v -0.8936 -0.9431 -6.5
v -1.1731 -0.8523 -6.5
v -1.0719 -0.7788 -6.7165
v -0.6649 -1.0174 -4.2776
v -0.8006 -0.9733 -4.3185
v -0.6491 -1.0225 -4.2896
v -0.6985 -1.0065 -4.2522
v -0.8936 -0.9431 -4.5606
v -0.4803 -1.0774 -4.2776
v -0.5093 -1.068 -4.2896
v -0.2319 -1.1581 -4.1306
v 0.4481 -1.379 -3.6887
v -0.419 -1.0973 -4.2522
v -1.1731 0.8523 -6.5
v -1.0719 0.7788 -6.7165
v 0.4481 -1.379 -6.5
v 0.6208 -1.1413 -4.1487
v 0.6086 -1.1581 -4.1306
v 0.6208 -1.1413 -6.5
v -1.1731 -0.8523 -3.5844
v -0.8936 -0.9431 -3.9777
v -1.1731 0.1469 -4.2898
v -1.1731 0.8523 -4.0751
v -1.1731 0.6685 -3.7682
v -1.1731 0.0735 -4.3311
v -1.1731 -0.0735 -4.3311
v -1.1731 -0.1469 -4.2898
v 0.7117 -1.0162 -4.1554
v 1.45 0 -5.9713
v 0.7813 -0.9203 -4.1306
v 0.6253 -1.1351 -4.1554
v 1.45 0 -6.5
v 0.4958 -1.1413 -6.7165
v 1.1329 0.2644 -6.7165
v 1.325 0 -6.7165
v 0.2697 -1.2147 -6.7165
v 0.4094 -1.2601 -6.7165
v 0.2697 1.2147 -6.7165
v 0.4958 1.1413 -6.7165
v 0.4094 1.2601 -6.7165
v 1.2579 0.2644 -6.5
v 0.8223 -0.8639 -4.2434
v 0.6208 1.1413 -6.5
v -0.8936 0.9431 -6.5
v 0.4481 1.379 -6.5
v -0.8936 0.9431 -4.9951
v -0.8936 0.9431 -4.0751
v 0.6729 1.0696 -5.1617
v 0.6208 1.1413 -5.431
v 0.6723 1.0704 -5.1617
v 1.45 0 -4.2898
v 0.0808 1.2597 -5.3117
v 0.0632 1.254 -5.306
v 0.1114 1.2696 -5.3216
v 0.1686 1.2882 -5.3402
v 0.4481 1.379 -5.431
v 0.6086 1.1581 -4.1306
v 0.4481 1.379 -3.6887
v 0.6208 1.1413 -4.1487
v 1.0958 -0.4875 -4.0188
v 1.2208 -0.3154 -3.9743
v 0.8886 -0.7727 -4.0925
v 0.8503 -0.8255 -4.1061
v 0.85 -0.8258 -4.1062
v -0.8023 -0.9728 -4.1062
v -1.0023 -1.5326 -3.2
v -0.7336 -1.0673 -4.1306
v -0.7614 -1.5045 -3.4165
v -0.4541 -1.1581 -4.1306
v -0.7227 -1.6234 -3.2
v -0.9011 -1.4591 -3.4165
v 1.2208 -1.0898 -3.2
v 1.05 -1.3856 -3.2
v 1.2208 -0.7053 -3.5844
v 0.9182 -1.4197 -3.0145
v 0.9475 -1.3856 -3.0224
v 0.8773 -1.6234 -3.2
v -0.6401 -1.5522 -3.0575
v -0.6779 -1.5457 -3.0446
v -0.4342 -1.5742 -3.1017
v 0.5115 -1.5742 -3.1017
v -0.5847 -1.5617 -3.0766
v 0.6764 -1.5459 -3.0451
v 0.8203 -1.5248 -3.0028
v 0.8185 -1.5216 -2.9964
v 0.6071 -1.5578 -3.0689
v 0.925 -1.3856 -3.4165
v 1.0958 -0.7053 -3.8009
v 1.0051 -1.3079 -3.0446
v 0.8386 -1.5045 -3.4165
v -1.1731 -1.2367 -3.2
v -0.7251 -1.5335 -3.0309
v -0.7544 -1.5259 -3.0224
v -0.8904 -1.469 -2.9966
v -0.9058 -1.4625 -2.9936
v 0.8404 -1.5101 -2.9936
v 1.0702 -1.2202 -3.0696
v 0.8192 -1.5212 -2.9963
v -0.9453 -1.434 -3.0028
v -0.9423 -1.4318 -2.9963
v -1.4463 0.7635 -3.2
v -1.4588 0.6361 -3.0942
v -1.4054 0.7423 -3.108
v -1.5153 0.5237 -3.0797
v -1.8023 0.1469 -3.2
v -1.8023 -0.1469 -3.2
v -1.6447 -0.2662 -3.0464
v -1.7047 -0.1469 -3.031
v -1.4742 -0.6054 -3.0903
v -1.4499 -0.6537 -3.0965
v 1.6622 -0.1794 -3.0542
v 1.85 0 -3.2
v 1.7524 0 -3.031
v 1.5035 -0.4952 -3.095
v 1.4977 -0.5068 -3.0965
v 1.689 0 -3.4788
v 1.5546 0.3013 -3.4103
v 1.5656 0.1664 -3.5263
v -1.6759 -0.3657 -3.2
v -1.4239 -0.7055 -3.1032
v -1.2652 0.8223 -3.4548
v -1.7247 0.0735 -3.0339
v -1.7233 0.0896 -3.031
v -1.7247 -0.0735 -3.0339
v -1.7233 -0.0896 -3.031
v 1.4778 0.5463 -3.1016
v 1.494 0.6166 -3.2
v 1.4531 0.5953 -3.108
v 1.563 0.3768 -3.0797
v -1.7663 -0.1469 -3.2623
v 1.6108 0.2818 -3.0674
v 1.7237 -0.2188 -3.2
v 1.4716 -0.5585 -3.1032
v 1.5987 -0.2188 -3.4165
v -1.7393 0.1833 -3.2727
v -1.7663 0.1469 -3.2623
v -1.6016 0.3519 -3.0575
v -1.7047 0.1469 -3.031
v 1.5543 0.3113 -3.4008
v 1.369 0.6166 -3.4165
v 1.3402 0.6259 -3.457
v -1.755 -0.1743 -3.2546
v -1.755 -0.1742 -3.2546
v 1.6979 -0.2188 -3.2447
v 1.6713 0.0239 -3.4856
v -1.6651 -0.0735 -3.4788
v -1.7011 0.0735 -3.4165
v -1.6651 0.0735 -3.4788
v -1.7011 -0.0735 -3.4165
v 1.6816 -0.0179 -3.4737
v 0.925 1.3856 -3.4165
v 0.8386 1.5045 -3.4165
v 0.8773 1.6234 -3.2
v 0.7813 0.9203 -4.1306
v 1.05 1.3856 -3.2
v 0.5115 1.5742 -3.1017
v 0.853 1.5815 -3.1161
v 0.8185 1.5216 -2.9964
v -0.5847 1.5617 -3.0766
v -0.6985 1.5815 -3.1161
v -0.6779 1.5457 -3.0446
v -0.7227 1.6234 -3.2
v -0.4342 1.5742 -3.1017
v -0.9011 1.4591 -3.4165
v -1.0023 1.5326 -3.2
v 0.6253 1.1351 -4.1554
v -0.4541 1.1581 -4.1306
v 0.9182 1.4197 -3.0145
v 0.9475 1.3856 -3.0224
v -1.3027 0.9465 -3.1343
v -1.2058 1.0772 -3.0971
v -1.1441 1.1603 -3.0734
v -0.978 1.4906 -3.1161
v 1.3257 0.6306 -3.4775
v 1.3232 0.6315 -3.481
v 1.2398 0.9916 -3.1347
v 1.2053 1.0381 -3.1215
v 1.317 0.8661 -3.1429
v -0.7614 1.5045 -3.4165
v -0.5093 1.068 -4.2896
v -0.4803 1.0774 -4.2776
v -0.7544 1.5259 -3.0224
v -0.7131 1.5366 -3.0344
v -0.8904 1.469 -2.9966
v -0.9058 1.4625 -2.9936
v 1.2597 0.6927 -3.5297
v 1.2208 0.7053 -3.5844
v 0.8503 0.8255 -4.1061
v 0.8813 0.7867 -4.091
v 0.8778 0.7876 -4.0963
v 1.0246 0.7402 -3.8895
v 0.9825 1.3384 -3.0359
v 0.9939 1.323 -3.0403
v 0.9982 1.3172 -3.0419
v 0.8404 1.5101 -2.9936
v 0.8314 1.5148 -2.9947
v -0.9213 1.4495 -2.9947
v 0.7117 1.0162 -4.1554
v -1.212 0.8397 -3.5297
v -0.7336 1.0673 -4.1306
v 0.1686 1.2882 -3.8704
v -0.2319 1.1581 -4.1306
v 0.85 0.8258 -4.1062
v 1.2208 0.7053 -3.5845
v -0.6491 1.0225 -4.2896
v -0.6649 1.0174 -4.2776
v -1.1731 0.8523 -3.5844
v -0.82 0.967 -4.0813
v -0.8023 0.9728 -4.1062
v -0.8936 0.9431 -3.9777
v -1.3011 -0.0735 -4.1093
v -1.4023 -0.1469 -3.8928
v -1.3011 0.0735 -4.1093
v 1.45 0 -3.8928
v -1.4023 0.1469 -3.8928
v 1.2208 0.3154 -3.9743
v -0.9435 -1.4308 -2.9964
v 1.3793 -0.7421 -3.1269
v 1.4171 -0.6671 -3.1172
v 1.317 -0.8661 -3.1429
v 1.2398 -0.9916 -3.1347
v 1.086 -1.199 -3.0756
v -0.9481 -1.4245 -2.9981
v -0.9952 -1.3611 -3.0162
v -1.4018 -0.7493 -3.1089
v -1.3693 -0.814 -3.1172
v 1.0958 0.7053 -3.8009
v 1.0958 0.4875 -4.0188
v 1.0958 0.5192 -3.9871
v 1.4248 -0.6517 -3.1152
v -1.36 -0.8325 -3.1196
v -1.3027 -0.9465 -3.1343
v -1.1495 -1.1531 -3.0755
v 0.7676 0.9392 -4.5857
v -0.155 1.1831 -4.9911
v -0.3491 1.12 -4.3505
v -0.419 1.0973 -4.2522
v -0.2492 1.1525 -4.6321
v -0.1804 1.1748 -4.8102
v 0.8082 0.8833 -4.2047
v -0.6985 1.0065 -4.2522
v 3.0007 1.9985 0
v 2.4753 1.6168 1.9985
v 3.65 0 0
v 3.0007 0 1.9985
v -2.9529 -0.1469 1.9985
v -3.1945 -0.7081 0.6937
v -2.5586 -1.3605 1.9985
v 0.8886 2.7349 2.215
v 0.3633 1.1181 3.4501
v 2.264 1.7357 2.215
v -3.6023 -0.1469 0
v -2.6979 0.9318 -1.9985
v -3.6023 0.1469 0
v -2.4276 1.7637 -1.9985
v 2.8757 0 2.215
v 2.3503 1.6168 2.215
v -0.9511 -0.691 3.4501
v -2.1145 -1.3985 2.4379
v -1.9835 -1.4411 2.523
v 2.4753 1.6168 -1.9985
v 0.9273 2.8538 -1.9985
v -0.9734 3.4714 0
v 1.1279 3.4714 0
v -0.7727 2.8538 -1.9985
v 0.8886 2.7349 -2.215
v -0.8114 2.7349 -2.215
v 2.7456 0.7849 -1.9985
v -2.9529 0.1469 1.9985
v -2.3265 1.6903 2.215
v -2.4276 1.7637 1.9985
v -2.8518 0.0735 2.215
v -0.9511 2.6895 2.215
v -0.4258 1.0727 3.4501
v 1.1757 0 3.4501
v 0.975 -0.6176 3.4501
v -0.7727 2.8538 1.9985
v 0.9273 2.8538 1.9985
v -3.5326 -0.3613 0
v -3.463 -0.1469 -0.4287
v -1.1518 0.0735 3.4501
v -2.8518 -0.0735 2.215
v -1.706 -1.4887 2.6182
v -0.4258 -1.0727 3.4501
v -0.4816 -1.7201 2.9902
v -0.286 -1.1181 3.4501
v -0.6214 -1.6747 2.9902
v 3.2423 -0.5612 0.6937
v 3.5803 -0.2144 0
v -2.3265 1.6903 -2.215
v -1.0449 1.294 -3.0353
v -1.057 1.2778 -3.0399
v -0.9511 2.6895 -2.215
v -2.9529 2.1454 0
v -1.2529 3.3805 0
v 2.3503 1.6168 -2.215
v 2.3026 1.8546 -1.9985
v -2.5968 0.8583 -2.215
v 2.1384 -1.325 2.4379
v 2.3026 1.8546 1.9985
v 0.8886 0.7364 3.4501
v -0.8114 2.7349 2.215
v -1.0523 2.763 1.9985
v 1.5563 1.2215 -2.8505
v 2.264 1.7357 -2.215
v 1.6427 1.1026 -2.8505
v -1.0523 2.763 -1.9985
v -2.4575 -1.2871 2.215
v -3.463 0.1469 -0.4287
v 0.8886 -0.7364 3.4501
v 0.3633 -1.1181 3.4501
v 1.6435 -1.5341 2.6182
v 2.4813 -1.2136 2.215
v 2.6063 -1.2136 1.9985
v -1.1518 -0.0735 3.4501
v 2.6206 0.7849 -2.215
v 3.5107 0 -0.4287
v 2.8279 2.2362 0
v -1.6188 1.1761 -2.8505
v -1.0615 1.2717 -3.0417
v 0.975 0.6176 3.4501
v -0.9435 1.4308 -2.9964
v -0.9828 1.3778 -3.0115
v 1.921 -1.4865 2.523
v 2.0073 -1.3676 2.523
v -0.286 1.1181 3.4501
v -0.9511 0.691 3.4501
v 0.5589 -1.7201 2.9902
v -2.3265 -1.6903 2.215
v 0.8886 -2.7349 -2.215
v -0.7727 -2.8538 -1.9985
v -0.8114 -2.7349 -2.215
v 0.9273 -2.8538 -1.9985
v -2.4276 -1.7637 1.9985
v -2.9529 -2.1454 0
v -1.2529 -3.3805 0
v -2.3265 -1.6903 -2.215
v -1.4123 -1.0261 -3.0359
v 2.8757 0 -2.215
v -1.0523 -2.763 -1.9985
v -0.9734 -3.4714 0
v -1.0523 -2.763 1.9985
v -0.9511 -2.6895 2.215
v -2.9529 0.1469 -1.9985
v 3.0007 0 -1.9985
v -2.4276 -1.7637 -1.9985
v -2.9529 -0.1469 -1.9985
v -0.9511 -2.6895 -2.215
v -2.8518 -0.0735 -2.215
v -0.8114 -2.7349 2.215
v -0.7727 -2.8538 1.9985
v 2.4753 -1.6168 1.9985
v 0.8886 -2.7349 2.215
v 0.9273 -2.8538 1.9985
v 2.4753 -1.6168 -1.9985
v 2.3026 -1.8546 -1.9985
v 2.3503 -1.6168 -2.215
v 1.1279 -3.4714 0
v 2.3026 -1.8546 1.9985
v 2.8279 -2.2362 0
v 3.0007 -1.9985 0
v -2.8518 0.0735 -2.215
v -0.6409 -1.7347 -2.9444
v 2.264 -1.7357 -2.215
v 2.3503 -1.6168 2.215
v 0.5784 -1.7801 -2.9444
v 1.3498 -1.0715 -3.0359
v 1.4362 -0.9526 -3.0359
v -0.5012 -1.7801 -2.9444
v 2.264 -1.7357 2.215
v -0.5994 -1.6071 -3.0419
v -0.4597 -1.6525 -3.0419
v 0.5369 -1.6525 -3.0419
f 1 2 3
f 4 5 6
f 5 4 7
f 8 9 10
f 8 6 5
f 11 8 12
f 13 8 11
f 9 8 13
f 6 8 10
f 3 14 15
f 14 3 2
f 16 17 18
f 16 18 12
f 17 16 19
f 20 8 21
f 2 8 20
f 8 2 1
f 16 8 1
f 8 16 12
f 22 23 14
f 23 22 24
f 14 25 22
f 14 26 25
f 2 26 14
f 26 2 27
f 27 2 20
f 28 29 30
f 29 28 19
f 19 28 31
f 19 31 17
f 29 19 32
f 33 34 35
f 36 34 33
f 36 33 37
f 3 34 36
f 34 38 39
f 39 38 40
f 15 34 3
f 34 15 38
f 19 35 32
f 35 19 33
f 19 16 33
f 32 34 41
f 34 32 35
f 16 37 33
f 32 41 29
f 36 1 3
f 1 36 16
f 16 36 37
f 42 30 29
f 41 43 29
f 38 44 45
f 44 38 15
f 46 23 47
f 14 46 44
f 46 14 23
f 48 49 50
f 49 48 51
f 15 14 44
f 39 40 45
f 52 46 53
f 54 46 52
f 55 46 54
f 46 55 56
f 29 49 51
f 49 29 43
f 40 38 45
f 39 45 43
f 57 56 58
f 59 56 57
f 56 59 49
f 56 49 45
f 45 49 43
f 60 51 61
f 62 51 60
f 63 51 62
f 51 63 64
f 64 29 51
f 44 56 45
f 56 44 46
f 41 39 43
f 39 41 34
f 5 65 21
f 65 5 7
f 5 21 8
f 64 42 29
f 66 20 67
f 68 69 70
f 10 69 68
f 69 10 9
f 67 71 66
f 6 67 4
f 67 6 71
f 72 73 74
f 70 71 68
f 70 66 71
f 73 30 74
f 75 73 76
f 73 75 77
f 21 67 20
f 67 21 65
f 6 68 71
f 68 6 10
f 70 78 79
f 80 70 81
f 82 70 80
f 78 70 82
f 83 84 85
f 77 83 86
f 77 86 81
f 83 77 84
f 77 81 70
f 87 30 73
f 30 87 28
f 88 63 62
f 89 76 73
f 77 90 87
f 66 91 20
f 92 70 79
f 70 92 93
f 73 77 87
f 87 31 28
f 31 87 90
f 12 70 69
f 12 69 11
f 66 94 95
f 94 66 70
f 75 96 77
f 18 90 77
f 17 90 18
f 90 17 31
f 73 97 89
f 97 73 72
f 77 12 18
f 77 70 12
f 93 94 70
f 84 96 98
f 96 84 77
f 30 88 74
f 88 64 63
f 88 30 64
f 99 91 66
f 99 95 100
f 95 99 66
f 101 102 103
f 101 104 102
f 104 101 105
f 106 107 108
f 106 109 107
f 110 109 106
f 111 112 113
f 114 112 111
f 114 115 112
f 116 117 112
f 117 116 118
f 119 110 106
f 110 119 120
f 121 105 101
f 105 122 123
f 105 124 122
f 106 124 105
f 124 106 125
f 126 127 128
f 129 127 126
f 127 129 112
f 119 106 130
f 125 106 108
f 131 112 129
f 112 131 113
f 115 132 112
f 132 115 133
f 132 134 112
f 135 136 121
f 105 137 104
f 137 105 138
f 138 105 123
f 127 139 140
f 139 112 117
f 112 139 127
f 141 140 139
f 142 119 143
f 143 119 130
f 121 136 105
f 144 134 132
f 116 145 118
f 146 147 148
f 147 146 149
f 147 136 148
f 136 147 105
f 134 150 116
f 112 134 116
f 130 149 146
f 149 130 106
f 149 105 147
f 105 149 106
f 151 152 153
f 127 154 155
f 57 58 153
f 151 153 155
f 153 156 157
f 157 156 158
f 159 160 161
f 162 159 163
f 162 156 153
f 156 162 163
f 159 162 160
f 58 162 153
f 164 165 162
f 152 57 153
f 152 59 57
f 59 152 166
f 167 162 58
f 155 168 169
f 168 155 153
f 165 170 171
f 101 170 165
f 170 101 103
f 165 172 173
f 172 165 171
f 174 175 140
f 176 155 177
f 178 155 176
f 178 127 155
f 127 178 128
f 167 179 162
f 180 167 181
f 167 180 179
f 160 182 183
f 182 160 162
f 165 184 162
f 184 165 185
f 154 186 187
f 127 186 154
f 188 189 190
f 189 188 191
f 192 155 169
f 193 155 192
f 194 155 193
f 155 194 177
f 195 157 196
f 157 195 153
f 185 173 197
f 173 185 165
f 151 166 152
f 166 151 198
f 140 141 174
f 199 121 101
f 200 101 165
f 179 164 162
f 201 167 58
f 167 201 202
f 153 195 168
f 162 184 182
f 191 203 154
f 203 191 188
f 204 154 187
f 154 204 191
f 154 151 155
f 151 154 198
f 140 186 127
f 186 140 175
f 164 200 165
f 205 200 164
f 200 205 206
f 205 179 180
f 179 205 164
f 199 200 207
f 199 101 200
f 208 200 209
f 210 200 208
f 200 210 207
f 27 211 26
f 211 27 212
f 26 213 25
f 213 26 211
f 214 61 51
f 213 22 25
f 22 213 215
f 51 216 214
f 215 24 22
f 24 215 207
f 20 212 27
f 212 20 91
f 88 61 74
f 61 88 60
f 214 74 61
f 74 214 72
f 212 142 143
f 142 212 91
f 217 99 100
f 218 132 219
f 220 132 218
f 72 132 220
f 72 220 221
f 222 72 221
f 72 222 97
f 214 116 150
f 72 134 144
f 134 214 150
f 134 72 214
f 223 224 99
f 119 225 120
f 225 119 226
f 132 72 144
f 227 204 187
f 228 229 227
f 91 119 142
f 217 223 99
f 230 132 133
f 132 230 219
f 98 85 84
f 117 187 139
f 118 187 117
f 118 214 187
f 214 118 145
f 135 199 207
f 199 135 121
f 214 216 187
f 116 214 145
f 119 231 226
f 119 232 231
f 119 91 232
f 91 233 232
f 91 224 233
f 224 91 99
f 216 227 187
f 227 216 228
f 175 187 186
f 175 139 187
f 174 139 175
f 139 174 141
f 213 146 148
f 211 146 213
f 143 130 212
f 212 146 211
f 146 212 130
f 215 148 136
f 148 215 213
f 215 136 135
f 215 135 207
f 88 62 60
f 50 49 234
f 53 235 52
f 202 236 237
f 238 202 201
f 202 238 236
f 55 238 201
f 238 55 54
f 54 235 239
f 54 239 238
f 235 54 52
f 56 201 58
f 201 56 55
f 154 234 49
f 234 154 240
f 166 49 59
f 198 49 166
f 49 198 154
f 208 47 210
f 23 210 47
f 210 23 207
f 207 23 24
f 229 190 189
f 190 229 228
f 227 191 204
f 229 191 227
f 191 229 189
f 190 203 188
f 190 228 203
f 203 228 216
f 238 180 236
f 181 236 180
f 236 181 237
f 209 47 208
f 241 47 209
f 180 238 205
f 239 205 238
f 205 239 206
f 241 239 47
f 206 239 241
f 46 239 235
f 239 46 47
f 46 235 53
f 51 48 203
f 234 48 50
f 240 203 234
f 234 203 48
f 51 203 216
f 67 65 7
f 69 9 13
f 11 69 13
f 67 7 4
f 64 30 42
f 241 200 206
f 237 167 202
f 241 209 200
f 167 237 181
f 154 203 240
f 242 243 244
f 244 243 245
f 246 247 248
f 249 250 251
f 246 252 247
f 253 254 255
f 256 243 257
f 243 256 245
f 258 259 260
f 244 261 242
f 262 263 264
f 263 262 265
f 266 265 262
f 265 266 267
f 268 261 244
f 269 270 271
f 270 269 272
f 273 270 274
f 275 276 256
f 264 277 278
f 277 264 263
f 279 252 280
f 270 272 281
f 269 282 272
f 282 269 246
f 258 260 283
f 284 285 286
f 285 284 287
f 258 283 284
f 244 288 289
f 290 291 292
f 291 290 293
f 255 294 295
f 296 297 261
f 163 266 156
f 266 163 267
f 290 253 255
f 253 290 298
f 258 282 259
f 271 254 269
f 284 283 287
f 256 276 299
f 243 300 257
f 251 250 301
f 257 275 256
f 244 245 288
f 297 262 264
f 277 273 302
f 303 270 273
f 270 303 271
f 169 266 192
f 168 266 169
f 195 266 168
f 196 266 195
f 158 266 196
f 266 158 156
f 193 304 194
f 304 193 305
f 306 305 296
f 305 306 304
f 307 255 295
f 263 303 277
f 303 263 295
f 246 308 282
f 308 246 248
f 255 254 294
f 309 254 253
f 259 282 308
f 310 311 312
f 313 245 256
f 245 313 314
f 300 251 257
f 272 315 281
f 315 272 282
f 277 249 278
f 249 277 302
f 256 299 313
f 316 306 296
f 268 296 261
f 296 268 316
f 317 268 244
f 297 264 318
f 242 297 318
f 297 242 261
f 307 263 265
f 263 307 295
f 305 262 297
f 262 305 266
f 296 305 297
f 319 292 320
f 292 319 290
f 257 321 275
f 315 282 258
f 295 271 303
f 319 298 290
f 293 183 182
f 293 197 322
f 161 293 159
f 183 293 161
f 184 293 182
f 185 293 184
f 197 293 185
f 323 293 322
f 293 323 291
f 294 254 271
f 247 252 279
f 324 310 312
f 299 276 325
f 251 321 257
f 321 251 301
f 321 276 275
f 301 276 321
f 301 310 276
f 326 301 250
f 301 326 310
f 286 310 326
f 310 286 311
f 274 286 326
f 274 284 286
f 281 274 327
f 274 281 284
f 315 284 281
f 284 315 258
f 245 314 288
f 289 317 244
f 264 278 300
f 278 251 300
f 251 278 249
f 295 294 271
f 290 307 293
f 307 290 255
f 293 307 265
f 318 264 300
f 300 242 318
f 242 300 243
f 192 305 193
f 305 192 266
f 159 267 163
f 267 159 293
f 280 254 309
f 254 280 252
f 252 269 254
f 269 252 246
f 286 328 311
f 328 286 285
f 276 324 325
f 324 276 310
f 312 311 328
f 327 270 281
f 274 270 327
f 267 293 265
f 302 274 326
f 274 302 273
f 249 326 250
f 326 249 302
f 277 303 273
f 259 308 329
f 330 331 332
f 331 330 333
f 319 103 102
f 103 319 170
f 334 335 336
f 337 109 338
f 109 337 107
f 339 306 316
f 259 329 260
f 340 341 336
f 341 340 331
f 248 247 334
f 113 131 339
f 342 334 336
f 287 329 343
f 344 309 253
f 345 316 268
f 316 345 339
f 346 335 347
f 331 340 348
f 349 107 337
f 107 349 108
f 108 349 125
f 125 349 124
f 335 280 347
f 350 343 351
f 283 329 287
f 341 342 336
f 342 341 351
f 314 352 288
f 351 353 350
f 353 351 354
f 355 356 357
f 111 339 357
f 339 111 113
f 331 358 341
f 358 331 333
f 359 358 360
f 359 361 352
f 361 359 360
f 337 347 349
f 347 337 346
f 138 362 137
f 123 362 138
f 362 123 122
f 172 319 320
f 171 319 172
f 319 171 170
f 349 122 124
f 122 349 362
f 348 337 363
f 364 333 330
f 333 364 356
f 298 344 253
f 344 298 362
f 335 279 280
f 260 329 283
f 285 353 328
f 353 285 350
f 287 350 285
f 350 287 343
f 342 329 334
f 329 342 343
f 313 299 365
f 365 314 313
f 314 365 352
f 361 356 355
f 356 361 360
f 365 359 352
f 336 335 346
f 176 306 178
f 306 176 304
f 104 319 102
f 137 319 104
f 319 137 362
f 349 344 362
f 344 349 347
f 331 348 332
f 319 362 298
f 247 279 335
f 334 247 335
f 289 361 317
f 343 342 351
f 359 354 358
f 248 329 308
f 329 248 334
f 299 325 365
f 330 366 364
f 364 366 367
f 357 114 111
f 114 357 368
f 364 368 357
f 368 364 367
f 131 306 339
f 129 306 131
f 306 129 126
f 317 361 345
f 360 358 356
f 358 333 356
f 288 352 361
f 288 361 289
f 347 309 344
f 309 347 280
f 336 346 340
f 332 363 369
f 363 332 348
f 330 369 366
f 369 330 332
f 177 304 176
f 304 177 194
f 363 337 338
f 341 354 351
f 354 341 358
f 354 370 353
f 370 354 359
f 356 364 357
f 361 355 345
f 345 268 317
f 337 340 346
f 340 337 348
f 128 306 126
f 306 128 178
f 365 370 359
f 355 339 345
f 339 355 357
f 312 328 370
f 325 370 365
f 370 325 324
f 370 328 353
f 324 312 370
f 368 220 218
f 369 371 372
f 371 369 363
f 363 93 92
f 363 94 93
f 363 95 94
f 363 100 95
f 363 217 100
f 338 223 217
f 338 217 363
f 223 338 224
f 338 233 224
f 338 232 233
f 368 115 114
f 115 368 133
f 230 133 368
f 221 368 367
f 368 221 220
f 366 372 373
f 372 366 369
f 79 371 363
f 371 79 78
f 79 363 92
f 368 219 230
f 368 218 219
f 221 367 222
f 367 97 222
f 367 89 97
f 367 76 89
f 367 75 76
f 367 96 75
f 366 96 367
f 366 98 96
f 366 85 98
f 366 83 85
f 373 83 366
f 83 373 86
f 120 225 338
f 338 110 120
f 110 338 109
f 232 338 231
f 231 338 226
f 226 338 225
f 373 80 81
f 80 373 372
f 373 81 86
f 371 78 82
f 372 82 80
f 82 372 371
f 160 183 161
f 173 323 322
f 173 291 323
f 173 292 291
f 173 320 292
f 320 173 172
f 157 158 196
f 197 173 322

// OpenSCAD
// Parameters
bbox_x = 6.8; //[3.4:13.6:0.1]
bbox_y = 6.8; //[3.4:13.6:0.1]
bbox_z = 9.9; //[5:19.8:0.1]
sphere_d = 6.8; //[3.4:13.6:0.1]
sphere_r = 3.4; //[1.7:6.8:0.1]
stem_h = 3.1; //[1.5:6.2:0.1]
stem_d = 2.4; //[1.2:4.8:0.1]
stem_r = 1.2; //[0.6:2.4:0.1]
stem_insert = 0.6; //[0.3:1.2:0.05]
facet_fn = 10; //[6:24:1]
overlap = 0.8; //[0.5:2:0.1]
chamfer_r = 0.25; //[0.1:0.6:0.05]
sphere_center_z = 0; //[-5:5:0.1]

// Base shapes
module faceted_sphere_body() {
  translate([0, 0, sphere_center_z])
    sphere(r=sphere_r, $fn=facet_fn);
}

module cylindrical_stem() {
  translate([0, 0, sphere_center_z - sphere_r - (stem_h + stem_insert)/2 + stem_insert])
    cylinder(r=stem_r, h=stem_h + stem_insert, center=true);
}

module sphere_stem_blend_overlap() {
  translate([0, 0, sphere_center_z - sphere_r + stem_insert - overlap/2])
    sphere(r=stem_r + overlap/2, center=true);
}

module small_edge_chamfer() {
  sphere(r=chamfer_r, center=true);
}

// Operations
module op_union_raw() {
  union() {
    faceted_sphere_body();
    cylindrical_stem();
    sphere_stem_blend_overlap();
  }
}

module op_facet_control_scale() {
  scale([bbox_x/sphere_d, bbox_y/sphere_d, bbox_z/(sphere_d + stem_h)])
    op_union_raw();
}

module op_small_edge_chamfer_minkowski() {
  minkowski() {
    op_facet_control_scale();
    small_edge_chamfer();
  }
}

// Final output
op_small_edge_chamfer_minkowski();
